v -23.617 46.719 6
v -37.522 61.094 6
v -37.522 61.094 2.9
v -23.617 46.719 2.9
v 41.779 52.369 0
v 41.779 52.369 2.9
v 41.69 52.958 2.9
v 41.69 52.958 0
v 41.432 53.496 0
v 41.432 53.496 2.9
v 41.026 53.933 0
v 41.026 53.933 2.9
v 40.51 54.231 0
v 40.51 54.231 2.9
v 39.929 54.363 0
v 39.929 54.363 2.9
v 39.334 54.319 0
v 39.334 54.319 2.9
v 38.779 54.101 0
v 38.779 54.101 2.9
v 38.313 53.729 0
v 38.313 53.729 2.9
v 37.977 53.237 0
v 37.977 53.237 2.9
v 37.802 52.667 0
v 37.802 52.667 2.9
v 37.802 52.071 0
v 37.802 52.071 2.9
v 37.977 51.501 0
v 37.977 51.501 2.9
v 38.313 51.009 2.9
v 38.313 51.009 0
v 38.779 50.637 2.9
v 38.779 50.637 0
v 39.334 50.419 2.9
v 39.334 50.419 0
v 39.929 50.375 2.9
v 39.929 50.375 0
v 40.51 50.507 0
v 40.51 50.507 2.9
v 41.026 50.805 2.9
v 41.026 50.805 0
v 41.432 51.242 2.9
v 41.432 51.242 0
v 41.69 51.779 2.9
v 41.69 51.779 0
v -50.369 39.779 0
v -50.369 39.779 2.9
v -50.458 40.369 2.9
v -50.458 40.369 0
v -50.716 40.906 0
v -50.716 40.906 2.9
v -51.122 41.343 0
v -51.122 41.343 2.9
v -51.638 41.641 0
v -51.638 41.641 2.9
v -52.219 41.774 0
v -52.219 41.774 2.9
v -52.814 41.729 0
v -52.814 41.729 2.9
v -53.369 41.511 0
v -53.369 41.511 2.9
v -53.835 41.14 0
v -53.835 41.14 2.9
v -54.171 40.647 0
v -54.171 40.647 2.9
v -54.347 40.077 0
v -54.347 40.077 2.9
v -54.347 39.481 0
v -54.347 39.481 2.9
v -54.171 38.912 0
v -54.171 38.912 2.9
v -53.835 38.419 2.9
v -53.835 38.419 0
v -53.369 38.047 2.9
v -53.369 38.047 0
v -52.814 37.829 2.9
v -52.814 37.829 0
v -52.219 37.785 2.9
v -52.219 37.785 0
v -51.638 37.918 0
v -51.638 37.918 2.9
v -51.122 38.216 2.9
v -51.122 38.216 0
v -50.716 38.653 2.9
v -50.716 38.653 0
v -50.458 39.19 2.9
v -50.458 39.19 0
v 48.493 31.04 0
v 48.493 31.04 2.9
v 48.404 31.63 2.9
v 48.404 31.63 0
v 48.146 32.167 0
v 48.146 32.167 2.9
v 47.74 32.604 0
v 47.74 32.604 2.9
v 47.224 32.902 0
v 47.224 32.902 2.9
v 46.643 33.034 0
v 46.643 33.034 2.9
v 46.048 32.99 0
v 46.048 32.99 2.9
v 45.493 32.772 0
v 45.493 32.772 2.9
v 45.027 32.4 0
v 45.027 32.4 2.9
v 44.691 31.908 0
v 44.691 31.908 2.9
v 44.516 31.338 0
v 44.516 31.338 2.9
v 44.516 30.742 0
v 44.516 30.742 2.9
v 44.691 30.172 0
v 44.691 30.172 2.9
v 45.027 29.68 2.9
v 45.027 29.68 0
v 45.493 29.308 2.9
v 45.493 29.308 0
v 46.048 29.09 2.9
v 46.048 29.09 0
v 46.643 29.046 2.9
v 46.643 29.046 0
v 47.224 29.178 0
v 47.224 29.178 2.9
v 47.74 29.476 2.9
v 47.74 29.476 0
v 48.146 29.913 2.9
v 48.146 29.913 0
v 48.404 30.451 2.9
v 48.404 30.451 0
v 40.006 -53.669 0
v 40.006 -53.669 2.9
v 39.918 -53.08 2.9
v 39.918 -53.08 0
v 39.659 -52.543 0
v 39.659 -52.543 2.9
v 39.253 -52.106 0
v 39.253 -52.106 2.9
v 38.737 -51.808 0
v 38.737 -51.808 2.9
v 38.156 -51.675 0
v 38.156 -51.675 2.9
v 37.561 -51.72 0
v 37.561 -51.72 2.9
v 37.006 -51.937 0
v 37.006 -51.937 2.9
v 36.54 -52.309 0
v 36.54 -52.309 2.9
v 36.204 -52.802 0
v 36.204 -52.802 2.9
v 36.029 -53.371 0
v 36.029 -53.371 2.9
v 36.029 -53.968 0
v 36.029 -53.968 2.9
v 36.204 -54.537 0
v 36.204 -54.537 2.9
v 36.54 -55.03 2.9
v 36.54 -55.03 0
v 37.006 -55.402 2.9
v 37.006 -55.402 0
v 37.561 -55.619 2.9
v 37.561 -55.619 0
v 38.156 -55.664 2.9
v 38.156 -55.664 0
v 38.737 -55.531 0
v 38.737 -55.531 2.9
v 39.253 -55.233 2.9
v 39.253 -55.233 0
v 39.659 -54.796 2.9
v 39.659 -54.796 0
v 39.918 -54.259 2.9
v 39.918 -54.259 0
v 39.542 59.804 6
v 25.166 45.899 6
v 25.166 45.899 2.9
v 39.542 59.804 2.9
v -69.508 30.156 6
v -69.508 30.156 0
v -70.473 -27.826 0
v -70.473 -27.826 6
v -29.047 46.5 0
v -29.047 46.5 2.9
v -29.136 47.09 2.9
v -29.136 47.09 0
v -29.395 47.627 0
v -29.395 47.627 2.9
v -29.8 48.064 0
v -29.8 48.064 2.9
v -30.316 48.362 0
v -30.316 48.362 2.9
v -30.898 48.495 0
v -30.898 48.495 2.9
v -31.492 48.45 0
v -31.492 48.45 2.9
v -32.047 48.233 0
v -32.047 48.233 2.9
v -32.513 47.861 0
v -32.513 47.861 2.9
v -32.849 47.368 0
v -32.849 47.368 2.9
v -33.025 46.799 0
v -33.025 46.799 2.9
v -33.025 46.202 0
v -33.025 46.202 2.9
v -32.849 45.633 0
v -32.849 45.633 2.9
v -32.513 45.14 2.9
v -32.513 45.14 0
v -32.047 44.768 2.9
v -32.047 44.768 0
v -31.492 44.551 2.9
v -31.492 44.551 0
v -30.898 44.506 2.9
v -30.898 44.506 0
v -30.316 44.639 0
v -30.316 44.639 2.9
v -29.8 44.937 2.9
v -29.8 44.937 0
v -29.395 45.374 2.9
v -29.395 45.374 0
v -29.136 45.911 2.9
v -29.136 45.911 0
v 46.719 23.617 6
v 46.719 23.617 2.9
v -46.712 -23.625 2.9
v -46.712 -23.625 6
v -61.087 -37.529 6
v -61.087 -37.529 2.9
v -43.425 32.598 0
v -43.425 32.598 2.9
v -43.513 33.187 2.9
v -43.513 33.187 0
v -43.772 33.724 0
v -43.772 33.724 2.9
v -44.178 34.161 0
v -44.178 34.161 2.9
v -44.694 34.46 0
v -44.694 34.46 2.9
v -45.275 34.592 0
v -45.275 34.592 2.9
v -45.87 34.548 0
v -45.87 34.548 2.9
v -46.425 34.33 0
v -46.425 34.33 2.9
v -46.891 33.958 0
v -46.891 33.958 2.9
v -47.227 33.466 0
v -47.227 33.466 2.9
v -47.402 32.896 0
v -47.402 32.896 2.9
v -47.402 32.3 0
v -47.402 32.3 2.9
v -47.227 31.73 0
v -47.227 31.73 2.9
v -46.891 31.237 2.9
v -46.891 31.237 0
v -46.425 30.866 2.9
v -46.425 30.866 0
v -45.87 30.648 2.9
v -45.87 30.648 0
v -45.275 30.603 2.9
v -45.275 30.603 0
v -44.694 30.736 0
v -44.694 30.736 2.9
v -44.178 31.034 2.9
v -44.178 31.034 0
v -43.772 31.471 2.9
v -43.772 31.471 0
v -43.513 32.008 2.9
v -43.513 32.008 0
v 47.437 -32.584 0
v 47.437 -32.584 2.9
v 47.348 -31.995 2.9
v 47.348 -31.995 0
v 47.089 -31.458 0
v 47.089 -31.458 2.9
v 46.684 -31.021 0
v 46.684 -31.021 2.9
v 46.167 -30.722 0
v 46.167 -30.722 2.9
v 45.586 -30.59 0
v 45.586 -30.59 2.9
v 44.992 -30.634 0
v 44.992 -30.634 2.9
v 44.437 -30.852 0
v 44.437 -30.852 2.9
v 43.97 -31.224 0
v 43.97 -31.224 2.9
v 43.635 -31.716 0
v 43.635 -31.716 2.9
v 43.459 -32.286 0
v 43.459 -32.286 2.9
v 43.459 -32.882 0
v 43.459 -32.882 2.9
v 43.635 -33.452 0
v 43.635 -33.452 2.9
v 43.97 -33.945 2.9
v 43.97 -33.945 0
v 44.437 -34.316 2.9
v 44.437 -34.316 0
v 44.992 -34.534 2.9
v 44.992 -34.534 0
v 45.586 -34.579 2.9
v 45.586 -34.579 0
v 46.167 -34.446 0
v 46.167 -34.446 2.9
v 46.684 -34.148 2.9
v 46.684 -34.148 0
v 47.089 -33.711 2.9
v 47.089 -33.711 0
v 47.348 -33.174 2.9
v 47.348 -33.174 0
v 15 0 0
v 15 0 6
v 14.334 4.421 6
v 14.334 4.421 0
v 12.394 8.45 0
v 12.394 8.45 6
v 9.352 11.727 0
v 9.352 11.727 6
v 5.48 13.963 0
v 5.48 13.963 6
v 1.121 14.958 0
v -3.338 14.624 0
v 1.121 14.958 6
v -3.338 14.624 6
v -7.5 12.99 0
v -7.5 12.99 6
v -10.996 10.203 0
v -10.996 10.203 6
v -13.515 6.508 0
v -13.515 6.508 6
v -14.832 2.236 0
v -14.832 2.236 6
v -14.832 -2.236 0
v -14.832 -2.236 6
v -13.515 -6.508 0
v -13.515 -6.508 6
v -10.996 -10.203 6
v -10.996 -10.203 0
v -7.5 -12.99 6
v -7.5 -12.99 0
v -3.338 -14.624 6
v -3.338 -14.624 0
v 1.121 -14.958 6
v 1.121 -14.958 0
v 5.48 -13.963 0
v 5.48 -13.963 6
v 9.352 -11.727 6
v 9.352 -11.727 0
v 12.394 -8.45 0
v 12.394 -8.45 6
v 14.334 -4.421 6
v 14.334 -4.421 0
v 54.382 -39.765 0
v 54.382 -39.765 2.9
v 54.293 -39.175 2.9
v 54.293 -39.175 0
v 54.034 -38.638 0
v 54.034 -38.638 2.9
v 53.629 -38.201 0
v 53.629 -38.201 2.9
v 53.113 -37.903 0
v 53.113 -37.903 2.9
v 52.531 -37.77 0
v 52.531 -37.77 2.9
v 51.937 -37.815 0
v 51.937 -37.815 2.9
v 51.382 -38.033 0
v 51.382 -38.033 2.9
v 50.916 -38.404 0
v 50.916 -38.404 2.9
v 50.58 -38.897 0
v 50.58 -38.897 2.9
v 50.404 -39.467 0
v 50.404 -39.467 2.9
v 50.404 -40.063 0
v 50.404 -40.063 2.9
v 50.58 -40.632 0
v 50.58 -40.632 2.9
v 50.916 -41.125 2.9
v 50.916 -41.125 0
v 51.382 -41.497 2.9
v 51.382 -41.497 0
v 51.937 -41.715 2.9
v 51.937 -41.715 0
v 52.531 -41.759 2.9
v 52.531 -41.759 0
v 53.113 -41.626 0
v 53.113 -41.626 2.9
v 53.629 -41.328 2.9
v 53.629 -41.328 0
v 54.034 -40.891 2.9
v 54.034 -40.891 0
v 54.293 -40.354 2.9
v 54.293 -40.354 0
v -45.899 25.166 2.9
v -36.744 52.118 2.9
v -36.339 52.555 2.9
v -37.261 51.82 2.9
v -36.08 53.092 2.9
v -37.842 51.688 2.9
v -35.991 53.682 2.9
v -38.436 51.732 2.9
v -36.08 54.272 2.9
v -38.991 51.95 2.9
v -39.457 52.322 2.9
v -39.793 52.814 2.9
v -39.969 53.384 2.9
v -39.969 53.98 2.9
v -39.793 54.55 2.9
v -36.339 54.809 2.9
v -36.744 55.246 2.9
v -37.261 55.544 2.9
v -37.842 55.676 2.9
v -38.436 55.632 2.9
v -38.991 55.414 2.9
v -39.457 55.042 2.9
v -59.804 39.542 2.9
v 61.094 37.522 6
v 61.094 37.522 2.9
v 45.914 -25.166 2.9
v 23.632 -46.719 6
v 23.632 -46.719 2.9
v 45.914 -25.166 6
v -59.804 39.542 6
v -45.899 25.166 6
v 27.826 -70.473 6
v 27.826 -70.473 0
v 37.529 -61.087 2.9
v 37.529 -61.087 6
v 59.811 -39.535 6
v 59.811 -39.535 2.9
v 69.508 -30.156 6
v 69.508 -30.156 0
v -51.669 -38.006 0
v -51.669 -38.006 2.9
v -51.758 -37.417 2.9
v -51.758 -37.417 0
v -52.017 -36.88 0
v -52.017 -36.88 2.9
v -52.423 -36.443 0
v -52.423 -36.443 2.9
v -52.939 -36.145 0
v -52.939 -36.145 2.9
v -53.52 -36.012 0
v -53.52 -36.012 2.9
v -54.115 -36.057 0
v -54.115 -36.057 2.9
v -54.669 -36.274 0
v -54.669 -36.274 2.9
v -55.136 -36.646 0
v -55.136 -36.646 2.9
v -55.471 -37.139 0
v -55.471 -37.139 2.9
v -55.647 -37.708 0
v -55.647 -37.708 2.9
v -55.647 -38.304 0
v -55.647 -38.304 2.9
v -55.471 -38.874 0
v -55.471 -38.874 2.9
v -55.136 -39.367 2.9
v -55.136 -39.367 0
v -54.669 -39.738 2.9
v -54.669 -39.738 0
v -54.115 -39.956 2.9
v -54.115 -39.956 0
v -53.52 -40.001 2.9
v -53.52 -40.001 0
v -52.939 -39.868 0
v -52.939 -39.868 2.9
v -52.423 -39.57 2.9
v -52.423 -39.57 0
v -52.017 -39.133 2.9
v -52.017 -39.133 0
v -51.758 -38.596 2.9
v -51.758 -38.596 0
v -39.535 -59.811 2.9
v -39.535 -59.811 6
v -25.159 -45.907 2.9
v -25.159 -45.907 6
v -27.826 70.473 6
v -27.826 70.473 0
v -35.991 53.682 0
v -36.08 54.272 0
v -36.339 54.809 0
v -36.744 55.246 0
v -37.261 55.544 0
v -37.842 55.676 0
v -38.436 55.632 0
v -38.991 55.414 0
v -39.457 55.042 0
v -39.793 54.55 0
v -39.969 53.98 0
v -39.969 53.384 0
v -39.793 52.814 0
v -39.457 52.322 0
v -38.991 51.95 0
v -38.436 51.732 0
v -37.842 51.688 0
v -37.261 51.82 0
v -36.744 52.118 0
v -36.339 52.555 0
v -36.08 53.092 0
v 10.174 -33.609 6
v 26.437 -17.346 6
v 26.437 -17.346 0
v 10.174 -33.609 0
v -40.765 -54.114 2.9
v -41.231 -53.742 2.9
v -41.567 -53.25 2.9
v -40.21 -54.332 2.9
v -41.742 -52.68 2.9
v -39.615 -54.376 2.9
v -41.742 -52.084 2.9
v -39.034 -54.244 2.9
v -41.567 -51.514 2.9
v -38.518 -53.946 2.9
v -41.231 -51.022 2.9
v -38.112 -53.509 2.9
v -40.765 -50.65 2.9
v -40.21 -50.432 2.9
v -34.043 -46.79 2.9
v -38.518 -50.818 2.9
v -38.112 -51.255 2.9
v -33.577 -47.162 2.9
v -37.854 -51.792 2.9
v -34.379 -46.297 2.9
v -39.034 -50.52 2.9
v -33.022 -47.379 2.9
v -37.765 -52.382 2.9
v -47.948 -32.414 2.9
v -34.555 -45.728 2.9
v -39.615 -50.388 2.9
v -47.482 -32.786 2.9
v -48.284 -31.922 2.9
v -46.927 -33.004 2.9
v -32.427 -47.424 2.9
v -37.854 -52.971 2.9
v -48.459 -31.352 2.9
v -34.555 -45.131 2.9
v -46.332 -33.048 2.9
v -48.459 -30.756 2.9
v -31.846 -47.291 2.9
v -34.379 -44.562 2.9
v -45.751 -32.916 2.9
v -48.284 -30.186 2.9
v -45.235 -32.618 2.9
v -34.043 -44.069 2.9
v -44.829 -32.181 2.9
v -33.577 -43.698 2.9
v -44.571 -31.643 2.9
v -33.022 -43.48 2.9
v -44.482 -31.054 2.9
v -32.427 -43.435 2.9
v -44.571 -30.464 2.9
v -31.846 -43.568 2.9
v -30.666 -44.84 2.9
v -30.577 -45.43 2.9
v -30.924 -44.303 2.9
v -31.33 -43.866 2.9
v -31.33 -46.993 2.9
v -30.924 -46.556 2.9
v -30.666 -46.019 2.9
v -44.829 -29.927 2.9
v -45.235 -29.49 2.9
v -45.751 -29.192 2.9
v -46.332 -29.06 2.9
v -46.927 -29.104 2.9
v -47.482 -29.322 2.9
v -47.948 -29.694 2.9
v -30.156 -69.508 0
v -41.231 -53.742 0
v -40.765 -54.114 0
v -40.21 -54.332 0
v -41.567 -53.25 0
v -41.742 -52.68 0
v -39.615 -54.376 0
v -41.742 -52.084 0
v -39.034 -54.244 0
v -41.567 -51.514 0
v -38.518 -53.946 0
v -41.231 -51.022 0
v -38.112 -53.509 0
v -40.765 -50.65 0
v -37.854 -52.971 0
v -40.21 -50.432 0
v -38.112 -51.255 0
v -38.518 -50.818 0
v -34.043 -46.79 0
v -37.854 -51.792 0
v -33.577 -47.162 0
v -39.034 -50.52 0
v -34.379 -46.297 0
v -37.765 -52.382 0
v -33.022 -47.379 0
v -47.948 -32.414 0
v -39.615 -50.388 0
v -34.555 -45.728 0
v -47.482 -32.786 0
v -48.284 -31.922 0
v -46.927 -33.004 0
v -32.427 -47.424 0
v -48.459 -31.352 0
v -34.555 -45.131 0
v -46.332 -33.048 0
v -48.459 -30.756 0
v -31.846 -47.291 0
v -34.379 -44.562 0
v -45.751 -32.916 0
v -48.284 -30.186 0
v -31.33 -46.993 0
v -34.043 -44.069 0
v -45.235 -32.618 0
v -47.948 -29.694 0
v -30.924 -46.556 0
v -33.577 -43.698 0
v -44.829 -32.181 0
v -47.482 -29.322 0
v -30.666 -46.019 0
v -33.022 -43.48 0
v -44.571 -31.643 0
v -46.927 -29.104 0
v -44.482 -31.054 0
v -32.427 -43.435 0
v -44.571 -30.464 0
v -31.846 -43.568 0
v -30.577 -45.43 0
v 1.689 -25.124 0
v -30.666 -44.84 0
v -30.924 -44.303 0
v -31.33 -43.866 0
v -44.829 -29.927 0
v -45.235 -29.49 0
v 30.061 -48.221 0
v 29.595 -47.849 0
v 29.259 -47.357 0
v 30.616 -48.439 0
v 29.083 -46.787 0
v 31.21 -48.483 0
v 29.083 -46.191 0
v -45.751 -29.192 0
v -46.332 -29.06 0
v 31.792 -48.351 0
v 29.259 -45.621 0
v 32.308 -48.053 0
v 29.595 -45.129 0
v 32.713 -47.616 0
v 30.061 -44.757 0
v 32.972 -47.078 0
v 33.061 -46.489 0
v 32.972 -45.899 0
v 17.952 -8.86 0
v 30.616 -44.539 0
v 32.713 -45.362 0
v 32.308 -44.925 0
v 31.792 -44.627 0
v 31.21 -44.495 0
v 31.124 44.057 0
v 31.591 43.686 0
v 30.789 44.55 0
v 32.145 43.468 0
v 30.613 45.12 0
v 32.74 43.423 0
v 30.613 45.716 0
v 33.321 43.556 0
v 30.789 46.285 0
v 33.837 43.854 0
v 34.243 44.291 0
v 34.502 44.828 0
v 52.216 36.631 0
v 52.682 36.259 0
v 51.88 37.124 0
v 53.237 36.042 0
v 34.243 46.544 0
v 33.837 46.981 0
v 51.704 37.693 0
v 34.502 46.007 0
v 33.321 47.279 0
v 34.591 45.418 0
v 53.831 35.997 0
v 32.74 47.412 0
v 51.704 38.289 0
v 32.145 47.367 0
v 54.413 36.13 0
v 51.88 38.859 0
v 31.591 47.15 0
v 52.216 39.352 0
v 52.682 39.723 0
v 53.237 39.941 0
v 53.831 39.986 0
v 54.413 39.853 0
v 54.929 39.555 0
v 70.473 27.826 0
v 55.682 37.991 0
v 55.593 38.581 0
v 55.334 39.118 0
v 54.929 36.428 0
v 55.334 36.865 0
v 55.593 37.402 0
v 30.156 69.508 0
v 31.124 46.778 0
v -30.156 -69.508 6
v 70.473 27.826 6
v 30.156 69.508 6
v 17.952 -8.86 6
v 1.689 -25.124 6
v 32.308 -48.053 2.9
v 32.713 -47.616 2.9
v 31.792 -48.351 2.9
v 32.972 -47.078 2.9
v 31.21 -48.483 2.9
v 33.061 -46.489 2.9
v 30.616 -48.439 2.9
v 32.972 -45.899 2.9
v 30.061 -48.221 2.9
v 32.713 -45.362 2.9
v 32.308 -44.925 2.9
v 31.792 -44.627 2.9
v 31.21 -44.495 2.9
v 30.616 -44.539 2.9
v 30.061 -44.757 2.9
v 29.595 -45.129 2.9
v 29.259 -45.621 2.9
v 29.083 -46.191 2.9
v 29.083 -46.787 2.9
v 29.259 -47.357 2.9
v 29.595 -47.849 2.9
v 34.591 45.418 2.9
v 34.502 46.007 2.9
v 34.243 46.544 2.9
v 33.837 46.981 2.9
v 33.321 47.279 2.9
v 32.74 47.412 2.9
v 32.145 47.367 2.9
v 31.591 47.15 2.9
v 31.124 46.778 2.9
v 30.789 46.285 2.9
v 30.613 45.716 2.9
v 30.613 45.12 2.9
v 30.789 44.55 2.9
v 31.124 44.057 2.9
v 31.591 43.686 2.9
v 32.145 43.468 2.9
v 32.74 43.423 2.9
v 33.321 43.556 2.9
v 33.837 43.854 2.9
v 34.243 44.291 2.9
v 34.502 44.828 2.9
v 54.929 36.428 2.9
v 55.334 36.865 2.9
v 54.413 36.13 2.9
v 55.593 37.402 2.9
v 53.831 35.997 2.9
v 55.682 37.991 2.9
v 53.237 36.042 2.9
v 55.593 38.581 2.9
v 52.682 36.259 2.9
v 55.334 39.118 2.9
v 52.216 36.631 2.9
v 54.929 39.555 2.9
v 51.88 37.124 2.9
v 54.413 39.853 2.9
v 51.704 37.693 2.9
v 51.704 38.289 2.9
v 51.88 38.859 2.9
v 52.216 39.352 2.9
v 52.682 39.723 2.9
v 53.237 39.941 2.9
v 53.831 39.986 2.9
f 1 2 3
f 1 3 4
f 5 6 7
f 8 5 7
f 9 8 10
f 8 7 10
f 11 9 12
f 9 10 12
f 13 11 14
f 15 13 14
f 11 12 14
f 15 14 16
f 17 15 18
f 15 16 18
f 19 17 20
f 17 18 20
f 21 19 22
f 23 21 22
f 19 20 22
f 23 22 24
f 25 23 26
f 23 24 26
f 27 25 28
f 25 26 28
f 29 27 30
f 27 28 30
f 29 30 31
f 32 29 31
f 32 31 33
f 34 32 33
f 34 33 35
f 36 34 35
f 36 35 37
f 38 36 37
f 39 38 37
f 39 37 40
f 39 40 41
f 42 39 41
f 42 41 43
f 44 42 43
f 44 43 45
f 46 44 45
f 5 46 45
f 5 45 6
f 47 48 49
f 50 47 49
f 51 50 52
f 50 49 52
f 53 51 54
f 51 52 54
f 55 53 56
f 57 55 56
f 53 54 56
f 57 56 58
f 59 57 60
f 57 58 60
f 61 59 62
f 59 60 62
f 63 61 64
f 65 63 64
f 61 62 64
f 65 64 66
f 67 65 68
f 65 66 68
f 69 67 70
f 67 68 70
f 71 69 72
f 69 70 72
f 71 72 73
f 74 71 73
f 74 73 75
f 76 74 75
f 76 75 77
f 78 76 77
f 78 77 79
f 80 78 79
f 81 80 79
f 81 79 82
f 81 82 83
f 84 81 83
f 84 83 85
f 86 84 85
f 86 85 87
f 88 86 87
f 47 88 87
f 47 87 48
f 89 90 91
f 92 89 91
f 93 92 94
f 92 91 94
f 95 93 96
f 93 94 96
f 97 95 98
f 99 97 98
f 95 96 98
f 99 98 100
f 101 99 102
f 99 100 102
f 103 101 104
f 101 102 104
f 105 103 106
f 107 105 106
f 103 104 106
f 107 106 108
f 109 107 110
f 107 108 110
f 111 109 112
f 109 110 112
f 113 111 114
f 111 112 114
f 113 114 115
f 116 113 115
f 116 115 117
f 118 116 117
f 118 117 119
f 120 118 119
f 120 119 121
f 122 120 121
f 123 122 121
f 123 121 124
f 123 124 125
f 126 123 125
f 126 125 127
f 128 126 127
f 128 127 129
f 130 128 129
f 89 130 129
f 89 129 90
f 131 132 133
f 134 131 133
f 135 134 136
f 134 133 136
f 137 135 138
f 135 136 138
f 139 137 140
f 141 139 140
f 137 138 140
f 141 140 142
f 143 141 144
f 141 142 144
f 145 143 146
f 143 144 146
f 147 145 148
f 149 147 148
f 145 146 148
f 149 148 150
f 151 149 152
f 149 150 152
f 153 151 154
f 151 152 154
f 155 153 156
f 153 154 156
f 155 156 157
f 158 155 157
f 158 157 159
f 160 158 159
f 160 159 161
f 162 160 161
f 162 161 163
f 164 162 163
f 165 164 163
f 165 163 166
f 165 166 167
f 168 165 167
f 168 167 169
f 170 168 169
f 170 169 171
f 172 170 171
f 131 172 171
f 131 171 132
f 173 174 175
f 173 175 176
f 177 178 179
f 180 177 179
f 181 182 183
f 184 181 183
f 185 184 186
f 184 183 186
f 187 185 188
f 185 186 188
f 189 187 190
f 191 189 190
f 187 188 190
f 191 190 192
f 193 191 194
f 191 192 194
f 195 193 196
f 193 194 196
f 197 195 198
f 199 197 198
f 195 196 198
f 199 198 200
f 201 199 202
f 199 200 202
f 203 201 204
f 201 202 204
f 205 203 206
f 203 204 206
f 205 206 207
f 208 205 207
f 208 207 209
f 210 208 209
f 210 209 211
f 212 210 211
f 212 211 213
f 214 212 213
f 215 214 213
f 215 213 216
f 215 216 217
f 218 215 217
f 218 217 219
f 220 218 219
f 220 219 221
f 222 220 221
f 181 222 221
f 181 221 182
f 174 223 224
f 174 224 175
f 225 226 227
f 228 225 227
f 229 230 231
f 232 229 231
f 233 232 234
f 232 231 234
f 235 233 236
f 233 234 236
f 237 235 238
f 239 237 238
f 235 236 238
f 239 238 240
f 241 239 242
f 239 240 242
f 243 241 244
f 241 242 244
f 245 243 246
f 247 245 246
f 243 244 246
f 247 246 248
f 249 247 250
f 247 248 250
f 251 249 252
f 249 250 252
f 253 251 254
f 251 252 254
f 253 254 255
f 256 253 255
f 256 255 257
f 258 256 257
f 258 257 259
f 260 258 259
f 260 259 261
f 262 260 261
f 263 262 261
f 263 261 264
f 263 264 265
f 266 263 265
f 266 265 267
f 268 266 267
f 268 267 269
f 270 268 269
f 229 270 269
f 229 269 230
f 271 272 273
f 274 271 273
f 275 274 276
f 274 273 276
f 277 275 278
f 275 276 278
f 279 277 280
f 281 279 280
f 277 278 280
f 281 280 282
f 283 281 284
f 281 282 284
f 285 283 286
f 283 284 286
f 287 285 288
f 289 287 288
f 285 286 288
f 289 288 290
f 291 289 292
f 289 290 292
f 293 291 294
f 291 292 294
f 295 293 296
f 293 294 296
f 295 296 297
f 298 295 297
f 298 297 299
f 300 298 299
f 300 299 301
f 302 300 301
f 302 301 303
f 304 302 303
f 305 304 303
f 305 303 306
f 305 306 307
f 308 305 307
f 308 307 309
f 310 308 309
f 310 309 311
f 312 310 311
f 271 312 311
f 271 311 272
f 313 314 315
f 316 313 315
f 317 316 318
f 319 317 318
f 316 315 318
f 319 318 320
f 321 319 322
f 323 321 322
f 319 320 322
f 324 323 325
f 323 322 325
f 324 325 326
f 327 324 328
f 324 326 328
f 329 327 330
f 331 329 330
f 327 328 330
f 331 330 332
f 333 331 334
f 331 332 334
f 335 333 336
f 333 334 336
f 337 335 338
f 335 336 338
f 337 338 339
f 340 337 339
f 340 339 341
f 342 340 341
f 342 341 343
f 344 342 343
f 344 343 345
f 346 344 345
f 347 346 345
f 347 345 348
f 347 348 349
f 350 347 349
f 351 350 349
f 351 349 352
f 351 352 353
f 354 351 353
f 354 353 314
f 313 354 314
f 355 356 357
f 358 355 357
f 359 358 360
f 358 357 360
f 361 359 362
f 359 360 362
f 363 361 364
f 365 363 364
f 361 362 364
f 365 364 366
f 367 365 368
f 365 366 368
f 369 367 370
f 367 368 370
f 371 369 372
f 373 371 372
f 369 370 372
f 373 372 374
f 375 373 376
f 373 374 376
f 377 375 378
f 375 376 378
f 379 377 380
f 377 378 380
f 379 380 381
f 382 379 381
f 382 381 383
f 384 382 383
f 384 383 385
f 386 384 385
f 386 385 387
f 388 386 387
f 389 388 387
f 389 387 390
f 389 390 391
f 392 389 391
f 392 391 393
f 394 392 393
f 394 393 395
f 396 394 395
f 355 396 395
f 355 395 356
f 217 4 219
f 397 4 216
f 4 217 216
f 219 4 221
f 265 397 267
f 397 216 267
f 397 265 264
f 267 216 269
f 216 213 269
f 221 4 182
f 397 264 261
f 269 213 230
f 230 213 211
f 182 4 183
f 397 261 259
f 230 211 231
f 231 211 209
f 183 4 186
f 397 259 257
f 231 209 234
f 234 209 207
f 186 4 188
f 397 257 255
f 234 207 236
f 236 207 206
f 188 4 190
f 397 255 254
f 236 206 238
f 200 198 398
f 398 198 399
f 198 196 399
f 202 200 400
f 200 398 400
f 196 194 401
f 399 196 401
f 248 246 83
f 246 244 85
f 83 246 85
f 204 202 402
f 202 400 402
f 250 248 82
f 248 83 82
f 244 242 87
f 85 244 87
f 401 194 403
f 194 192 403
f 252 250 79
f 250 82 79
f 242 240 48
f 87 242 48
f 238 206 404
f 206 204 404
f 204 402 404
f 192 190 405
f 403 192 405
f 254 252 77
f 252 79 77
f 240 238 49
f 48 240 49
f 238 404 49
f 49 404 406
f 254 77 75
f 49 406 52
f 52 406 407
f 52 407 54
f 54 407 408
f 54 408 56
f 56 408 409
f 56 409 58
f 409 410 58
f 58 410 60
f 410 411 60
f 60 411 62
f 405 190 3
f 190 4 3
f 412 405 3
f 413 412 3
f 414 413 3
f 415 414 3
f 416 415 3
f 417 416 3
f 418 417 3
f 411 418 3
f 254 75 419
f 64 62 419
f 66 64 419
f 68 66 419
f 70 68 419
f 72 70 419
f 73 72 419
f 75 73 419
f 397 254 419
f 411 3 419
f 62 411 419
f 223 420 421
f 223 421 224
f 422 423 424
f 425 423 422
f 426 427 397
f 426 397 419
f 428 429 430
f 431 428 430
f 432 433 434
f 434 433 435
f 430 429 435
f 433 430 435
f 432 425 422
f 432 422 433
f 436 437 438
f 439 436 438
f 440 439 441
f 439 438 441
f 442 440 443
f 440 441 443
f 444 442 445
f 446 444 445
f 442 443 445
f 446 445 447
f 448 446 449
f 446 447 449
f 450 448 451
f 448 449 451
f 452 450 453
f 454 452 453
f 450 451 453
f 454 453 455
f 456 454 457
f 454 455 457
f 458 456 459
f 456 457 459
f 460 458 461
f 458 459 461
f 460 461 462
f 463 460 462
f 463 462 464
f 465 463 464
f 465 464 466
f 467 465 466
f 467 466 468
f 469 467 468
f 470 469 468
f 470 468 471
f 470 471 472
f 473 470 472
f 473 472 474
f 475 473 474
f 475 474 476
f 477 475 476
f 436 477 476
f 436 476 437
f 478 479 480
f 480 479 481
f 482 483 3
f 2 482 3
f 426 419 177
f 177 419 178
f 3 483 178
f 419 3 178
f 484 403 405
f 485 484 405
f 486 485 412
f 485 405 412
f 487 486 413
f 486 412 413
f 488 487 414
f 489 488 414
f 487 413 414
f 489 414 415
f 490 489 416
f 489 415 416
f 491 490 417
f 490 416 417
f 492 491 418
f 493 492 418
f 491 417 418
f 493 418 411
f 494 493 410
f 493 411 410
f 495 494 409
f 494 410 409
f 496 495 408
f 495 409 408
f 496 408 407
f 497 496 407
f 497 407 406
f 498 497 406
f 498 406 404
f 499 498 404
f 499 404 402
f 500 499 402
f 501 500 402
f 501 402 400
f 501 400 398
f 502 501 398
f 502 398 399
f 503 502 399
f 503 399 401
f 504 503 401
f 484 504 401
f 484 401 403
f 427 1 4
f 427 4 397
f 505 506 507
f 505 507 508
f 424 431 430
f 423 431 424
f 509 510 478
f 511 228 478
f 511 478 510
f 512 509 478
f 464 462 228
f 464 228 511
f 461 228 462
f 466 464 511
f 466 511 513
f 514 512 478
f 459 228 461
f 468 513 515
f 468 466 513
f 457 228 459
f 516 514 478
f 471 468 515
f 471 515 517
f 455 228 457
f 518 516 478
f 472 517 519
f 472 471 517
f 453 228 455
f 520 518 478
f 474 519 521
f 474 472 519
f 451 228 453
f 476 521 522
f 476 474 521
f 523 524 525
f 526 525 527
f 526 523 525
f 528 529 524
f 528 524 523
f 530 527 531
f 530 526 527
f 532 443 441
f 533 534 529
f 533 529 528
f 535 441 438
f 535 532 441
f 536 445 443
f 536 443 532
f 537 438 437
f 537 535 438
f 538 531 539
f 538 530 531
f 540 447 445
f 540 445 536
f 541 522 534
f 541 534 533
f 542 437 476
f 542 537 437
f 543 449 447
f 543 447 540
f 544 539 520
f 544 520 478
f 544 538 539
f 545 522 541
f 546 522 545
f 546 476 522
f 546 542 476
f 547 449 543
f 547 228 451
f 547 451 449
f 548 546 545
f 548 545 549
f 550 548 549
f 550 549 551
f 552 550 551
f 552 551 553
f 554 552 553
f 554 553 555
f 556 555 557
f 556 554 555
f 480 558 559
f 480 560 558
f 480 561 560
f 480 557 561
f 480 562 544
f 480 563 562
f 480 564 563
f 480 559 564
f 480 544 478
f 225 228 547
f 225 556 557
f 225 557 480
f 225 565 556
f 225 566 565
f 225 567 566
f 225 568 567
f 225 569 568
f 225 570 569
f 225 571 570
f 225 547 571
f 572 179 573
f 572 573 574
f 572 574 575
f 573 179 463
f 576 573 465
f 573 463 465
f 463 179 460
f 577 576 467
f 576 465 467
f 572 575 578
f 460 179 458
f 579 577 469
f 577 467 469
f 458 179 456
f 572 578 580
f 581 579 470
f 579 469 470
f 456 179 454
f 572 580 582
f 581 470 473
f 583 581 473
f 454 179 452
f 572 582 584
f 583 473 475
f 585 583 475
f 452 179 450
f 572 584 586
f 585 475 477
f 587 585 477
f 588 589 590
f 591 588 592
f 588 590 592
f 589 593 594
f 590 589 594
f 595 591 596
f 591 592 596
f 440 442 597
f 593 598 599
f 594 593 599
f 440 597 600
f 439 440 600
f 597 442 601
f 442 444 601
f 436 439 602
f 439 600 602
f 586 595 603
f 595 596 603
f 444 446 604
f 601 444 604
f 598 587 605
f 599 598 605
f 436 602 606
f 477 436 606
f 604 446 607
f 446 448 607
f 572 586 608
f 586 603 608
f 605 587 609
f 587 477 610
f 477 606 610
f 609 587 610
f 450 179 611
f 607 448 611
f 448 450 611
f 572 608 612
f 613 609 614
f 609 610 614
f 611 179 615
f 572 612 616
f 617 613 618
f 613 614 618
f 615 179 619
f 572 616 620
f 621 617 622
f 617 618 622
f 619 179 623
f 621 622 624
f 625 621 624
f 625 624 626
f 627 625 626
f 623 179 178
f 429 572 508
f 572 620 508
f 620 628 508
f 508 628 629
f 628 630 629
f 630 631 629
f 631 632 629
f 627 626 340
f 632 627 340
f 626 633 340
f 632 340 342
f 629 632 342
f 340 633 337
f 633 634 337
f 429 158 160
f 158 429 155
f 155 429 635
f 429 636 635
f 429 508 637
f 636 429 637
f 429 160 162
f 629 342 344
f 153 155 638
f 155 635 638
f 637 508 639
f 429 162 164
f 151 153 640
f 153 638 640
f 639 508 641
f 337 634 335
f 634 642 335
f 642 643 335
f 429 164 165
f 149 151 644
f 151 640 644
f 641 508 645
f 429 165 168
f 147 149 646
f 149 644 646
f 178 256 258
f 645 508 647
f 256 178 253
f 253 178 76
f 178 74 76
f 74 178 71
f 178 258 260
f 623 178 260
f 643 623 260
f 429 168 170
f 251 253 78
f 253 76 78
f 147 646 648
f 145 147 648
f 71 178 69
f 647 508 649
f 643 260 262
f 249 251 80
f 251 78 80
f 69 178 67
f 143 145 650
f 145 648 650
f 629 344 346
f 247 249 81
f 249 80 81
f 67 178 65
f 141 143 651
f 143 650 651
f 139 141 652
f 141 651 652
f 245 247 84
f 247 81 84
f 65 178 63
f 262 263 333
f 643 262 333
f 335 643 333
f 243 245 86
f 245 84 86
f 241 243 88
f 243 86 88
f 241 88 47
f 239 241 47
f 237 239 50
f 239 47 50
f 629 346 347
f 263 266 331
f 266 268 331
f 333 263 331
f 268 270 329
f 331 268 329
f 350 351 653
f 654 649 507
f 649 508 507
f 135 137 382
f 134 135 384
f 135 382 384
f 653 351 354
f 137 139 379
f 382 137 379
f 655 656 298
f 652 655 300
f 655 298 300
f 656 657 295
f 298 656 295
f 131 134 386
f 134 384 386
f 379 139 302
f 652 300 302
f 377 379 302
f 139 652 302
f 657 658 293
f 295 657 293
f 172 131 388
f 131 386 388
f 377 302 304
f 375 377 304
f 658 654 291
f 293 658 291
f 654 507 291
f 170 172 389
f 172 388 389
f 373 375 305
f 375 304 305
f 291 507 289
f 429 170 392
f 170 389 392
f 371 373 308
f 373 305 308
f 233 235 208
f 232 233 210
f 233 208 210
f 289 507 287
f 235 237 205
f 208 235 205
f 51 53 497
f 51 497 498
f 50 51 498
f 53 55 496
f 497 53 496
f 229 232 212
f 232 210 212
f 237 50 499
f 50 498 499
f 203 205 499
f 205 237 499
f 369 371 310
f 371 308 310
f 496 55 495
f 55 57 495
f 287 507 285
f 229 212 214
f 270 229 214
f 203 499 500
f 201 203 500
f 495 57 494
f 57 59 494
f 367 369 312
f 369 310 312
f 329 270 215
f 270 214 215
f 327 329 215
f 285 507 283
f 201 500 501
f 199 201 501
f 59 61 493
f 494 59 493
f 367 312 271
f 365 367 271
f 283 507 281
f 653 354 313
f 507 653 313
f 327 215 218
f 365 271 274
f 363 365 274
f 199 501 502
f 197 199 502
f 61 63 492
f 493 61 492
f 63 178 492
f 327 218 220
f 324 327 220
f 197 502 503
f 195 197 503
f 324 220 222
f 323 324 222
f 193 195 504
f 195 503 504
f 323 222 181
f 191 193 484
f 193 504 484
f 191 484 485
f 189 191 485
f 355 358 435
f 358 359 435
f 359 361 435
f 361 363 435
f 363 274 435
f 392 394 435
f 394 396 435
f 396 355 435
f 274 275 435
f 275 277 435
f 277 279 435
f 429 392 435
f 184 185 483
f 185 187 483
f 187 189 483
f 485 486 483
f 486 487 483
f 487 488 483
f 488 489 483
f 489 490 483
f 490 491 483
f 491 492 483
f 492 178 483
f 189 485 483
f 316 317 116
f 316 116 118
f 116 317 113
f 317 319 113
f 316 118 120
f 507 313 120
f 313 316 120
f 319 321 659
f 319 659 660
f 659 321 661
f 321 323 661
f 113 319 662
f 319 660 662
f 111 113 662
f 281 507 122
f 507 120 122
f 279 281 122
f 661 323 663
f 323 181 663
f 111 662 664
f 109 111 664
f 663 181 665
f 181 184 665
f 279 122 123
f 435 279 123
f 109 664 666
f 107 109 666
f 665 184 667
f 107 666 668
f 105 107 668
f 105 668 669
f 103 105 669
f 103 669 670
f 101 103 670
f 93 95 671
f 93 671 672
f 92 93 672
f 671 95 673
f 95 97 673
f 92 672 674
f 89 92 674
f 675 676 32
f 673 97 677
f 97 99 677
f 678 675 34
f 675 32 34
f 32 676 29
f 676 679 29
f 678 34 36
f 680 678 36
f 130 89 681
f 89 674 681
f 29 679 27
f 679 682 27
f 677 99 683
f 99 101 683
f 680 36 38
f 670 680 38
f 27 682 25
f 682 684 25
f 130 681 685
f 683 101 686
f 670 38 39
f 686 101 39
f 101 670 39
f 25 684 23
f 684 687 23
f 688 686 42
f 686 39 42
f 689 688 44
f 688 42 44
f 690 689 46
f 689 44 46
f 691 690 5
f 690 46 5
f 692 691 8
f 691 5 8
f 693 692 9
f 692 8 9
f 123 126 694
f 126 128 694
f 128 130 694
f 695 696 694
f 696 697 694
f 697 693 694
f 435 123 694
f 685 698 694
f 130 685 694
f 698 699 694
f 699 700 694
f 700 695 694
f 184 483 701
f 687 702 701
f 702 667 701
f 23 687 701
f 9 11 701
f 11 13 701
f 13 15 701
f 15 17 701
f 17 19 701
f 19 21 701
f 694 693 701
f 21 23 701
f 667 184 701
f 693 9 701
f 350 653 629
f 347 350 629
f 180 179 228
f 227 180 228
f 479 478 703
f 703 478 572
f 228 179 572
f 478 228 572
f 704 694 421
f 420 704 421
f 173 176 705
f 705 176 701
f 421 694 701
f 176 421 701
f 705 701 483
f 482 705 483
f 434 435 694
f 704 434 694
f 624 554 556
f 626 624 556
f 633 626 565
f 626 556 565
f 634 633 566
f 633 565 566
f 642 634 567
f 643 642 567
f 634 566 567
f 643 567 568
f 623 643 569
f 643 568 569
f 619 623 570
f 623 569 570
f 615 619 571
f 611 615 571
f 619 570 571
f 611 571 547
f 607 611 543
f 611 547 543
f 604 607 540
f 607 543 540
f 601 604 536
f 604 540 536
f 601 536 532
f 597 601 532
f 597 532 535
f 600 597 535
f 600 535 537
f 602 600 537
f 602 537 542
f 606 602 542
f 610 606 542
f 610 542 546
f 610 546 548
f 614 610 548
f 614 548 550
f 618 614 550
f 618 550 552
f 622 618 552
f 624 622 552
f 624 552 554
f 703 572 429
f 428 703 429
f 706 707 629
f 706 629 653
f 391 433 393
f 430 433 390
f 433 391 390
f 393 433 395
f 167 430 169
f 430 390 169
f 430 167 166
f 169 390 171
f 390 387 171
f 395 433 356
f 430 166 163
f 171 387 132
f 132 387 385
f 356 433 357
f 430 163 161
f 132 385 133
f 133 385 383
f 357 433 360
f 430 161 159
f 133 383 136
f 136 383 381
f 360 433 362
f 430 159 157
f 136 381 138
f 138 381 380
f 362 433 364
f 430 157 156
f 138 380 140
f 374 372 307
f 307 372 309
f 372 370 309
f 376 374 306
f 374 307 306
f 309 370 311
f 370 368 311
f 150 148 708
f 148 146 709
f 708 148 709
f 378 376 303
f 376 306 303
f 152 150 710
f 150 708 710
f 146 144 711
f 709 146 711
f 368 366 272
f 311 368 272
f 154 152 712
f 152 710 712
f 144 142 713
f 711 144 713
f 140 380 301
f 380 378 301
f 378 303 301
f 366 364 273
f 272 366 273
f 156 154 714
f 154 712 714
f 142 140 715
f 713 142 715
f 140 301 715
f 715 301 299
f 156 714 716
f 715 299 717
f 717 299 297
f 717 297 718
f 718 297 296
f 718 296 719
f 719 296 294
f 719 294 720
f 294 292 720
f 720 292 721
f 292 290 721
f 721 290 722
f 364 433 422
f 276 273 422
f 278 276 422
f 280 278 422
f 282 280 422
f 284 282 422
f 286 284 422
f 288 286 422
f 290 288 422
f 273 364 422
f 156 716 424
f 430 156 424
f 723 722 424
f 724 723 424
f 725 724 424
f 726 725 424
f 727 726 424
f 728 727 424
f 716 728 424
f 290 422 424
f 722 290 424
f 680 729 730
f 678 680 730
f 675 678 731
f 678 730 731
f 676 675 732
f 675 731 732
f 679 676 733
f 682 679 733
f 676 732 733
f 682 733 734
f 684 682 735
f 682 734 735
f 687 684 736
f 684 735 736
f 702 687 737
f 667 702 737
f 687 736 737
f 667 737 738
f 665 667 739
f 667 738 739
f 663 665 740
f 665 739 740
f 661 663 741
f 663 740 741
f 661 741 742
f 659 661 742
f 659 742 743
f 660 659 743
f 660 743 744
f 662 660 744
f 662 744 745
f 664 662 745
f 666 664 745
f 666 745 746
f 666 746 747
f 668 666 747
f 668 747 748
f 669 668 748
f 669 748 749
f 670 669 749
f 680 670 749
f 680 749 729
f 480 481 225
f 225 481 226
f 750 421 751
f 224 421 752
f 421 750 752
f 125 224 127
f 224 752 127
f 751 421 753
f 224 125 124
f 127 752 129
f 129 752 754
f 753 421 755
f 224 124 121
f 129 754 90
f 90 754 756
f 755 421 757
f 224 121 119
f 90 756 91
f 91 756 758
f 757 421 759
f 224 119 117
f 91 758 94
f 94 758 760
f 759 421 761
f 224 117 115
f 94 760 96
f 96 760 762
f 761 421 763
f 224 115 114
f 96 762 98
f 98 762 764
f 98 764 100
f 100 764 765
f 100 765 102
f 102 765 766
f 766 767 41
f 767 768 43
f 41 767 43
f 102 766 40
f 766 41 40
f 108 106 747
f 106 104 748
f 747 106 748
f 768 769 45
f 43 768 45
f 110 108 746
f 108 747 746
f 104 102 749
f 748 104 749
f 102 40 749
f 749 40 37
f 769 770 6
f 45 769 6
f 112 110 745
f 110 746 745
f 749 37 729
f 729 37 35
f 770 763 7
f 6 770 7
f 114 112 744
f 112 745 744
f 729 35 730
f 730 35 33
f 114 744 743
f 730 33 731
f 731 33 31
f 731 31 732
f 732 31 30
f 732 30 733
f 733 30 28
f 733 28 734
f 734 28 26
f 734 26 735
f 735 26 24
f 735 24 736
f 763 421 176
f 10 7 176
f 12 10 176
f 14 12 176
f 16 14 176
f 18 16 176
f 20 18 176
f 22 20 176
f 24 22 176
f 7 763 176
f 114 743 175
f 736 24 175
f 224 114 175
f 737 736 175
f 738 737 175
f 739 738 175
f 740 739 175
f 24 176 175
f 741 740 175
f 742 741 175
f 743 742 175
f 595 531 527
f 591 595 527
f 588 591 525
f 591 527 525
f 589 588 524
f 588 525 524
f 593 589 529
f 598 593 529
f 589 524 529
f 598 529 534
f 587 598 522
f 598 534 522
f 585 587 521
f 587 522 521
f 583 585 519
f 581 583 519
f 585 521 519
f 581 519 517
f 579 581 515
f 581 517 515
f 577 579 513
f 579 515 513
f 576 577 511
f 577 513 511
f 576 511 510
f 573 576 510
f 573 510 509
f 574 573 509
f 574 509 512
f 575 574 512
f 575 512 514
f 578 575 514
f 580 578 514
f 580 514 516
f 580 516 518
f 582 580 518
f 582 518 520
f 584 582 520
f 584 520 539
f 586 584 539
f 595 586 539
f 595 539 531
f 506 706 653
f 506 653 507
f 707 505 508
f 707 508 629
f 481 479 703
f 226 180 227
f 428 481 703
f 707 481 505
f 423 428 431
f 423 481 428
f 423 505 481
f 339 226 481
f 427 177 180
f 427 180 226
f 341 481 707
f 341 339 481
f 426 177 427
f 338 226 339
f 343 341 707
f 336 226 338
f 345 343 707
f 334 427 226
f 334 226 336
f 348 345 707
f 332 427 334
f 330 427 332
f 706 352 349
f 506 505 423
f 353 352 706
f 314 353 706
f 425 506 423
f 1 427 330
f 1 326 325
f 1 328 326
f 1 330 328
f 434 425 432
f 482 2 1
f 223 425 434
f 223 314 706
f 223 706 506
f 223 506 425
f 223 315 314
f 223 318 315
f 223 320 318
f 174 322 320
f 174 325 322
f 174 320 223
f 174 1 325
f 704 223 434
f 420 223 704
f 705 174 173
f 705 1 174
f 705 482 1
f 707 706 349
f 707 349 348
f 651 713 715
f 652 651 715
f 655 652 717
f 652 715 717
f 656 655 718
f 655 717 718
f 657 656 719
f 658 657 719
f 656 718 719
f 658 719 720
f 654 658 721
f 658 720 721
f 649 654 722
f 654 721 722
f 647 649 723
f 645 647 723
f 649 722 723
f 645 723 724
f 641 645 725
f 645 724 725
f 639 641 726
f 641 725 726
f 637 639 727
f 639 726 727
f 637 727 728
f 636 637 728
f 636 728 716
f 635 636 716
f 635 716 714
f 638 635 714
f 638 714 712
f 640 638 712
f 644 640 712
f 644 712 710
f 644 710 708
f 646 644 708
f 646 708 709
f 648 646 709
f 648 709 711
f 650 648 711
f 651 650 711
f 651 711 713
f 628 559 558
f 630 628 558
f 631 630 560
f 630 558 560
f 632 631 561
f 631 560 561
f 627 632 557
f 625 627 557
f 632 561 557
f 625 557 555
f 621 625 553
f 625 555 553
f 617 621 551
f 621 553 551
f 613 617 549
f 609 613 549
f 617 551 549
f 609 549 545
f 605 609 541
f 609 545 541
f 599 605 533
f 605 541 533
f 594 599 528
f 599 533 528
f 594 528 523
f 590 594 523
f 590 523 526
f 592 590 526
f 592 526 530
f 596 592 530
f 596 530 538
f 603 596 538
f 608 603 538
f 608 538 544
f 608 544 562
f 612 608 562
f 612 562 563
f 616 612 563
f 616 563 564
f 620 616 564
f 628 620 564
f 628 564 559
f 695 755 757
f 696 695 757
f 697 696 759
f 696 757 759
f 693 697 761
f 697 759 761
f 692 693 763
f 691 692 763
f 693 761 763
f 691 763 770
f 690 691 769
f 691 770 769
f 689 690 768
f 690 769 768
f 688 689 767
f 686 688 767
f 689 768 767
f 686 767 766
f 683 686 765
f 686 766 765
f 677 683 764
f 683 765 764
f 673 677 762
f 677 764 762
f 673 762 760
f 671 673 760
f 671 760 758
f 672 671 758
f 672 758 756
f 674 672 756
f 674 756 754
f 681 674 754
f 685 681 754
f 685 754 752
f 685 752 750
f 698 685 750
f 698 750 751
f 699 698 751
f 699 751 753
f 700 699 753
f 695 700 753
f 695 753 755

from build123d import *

# Parameters (mm, degrees)
RESSALTO_EXTRUS_O1_DEPTH = 6
CORTE_EXTRUS_O1_DEPTH    = 3.1
ESBO_O4_R                = 15
CORTE_EXTRUS_O2_DEPTH    = 100.844211363
ESBO_O6_R                = 2
CORTE_EXTRUS_O3_DEPTH    = 3.1
CORTE_EXTRUS_O7_DEPTH    = 10


with BuildPart() as part:
    # Esboço2 → Ressalto-extrusão1 (new body)
    with BuildSketch(Plane.XY):
        Polygon((70.472925804, 27.825776133), (30.15608873, 69.507678721), (-27.825776133, 70.472925804), (-69.507678721, 30.15608873), (-70.472925804, -27.825776133), (-30.15608873, -69.507678721), (27.825776133, -70.472925804), (69.507678721, -30.15608873), align=None)
    extrude(amount=RESSALTO_EXTRUS_O1_DEPTH)

    # Esboço3 → Corte-extrusão1 (cut)
    with BuildSketch(Plane.XY.offset(6)):
        Polygon((-61.0871998, -37.529288249), (-39.534791939, -59.811427182), (-25.159218434, -45.906647917), (-46.711626295, -23.624508984), align=None)
        Polygon((46.71864909, 23.617248408), (25.166241229, 45.899387341), (39.541814734, 59.804166606), (61.094222595, 37.522027673), align=None)
        Polygon((-59.804166606, 39.541814734), (-37.522027673, 61.094222595), (-23.617248408, 46.71864909), (-45.899387341, 25.166241229), align=None)
        Polygon((23.631531779, -46.718886871), (45.913670712, -25.16647901), (59.818449977, -39.542052515), (37.536311044, -61.094460376), align=None)
    extrude(amount=-CORTE_EXTRUS_O1_DEPTH, mode=Mode.SUBTRACT)

    # Esboço4 → Corte-extrusão2 (cut, through all)
    with BuildSketch(Plane.XY.offset(6)):
        Circle(ESBO_O4_R)
    extrude(amount=-CORTE_EXTRUS_O2_DEPTH, mode=Mode.SUBTRACT)

    # Esboço6 → Corte-extrusão3 (cut)
    with BuildSketch(Plane.XY.offset(2.9)):
        with Locations((-46.481705373, -31.053986514)):
            Circle(ESBO_O6_R)
        with Locations((-53.669492126, -38.006376147)):
            Circle(ESBO_O6_R)
        with Locations((-39.764712861, -52.381949652)):
            Circle(ESBO_O6_R)
        with Locations((-32.576926108, -45.429560019)):
            Circle(ESBO_O6_R)
        with Locations((39.779293109, 52.368949317)):
            Circle(ESBO_O6_R)
        with Locations((32.590503175, 45.417596982)):
            Circle(ESBO_O6_R)
        with Locations((53.681997779, 37.991369449)):
            Circle(ESBO_O6_R)
        with Locations((46.493207845, 31.040017114)):
            Circle(ESBO_O6_R)
        with Locations((38.006376147, -53.669492126)):
            Circle(ESBO_O6_R)
        with Locations((31.061009309, -46.488965949)):
            Circle(ESBO_O6_R)
        with Locations((52.381949652, -39.764712861)):
            Circle(ESBO_O6_R)
        with Locations((45.436582814, -32.584186684)):
            Circle(ESBO_O6_R)
        with Locations((-37.991369449, 53.681997779)):
            Circle(ESBO_O6_R)
        with Locations((-31.047038861, 46.500469435)):
            Circle(ESBO_O6_R)
        with Locations((-45.424618729, 32.597764765)):
            Circle(ESBO_O6_R)
        with Locations((-52.368949317, 39.779293109)):
            Circle(ESBO_O6_R)
    extrude(amount=-CORTE_EXTRUS_O3_DEPTH, mode=Mode.SUBTRACT)

    # Esboço7 → Corte-extrusão7 (cut)
    with BuildSketch(Plane.XY.offset(6)):
        Polygon((10.173878015, -33.609114275), (1.688596641, -25.123832901), (17.952052608, -8.860376934), (26.437333982, -17.345658308), align=None)
    extrude(amount=-CORTE_EXTRUS_O7_DEPTH, mode=Mode.SUBTRACT)


solid = part.part
